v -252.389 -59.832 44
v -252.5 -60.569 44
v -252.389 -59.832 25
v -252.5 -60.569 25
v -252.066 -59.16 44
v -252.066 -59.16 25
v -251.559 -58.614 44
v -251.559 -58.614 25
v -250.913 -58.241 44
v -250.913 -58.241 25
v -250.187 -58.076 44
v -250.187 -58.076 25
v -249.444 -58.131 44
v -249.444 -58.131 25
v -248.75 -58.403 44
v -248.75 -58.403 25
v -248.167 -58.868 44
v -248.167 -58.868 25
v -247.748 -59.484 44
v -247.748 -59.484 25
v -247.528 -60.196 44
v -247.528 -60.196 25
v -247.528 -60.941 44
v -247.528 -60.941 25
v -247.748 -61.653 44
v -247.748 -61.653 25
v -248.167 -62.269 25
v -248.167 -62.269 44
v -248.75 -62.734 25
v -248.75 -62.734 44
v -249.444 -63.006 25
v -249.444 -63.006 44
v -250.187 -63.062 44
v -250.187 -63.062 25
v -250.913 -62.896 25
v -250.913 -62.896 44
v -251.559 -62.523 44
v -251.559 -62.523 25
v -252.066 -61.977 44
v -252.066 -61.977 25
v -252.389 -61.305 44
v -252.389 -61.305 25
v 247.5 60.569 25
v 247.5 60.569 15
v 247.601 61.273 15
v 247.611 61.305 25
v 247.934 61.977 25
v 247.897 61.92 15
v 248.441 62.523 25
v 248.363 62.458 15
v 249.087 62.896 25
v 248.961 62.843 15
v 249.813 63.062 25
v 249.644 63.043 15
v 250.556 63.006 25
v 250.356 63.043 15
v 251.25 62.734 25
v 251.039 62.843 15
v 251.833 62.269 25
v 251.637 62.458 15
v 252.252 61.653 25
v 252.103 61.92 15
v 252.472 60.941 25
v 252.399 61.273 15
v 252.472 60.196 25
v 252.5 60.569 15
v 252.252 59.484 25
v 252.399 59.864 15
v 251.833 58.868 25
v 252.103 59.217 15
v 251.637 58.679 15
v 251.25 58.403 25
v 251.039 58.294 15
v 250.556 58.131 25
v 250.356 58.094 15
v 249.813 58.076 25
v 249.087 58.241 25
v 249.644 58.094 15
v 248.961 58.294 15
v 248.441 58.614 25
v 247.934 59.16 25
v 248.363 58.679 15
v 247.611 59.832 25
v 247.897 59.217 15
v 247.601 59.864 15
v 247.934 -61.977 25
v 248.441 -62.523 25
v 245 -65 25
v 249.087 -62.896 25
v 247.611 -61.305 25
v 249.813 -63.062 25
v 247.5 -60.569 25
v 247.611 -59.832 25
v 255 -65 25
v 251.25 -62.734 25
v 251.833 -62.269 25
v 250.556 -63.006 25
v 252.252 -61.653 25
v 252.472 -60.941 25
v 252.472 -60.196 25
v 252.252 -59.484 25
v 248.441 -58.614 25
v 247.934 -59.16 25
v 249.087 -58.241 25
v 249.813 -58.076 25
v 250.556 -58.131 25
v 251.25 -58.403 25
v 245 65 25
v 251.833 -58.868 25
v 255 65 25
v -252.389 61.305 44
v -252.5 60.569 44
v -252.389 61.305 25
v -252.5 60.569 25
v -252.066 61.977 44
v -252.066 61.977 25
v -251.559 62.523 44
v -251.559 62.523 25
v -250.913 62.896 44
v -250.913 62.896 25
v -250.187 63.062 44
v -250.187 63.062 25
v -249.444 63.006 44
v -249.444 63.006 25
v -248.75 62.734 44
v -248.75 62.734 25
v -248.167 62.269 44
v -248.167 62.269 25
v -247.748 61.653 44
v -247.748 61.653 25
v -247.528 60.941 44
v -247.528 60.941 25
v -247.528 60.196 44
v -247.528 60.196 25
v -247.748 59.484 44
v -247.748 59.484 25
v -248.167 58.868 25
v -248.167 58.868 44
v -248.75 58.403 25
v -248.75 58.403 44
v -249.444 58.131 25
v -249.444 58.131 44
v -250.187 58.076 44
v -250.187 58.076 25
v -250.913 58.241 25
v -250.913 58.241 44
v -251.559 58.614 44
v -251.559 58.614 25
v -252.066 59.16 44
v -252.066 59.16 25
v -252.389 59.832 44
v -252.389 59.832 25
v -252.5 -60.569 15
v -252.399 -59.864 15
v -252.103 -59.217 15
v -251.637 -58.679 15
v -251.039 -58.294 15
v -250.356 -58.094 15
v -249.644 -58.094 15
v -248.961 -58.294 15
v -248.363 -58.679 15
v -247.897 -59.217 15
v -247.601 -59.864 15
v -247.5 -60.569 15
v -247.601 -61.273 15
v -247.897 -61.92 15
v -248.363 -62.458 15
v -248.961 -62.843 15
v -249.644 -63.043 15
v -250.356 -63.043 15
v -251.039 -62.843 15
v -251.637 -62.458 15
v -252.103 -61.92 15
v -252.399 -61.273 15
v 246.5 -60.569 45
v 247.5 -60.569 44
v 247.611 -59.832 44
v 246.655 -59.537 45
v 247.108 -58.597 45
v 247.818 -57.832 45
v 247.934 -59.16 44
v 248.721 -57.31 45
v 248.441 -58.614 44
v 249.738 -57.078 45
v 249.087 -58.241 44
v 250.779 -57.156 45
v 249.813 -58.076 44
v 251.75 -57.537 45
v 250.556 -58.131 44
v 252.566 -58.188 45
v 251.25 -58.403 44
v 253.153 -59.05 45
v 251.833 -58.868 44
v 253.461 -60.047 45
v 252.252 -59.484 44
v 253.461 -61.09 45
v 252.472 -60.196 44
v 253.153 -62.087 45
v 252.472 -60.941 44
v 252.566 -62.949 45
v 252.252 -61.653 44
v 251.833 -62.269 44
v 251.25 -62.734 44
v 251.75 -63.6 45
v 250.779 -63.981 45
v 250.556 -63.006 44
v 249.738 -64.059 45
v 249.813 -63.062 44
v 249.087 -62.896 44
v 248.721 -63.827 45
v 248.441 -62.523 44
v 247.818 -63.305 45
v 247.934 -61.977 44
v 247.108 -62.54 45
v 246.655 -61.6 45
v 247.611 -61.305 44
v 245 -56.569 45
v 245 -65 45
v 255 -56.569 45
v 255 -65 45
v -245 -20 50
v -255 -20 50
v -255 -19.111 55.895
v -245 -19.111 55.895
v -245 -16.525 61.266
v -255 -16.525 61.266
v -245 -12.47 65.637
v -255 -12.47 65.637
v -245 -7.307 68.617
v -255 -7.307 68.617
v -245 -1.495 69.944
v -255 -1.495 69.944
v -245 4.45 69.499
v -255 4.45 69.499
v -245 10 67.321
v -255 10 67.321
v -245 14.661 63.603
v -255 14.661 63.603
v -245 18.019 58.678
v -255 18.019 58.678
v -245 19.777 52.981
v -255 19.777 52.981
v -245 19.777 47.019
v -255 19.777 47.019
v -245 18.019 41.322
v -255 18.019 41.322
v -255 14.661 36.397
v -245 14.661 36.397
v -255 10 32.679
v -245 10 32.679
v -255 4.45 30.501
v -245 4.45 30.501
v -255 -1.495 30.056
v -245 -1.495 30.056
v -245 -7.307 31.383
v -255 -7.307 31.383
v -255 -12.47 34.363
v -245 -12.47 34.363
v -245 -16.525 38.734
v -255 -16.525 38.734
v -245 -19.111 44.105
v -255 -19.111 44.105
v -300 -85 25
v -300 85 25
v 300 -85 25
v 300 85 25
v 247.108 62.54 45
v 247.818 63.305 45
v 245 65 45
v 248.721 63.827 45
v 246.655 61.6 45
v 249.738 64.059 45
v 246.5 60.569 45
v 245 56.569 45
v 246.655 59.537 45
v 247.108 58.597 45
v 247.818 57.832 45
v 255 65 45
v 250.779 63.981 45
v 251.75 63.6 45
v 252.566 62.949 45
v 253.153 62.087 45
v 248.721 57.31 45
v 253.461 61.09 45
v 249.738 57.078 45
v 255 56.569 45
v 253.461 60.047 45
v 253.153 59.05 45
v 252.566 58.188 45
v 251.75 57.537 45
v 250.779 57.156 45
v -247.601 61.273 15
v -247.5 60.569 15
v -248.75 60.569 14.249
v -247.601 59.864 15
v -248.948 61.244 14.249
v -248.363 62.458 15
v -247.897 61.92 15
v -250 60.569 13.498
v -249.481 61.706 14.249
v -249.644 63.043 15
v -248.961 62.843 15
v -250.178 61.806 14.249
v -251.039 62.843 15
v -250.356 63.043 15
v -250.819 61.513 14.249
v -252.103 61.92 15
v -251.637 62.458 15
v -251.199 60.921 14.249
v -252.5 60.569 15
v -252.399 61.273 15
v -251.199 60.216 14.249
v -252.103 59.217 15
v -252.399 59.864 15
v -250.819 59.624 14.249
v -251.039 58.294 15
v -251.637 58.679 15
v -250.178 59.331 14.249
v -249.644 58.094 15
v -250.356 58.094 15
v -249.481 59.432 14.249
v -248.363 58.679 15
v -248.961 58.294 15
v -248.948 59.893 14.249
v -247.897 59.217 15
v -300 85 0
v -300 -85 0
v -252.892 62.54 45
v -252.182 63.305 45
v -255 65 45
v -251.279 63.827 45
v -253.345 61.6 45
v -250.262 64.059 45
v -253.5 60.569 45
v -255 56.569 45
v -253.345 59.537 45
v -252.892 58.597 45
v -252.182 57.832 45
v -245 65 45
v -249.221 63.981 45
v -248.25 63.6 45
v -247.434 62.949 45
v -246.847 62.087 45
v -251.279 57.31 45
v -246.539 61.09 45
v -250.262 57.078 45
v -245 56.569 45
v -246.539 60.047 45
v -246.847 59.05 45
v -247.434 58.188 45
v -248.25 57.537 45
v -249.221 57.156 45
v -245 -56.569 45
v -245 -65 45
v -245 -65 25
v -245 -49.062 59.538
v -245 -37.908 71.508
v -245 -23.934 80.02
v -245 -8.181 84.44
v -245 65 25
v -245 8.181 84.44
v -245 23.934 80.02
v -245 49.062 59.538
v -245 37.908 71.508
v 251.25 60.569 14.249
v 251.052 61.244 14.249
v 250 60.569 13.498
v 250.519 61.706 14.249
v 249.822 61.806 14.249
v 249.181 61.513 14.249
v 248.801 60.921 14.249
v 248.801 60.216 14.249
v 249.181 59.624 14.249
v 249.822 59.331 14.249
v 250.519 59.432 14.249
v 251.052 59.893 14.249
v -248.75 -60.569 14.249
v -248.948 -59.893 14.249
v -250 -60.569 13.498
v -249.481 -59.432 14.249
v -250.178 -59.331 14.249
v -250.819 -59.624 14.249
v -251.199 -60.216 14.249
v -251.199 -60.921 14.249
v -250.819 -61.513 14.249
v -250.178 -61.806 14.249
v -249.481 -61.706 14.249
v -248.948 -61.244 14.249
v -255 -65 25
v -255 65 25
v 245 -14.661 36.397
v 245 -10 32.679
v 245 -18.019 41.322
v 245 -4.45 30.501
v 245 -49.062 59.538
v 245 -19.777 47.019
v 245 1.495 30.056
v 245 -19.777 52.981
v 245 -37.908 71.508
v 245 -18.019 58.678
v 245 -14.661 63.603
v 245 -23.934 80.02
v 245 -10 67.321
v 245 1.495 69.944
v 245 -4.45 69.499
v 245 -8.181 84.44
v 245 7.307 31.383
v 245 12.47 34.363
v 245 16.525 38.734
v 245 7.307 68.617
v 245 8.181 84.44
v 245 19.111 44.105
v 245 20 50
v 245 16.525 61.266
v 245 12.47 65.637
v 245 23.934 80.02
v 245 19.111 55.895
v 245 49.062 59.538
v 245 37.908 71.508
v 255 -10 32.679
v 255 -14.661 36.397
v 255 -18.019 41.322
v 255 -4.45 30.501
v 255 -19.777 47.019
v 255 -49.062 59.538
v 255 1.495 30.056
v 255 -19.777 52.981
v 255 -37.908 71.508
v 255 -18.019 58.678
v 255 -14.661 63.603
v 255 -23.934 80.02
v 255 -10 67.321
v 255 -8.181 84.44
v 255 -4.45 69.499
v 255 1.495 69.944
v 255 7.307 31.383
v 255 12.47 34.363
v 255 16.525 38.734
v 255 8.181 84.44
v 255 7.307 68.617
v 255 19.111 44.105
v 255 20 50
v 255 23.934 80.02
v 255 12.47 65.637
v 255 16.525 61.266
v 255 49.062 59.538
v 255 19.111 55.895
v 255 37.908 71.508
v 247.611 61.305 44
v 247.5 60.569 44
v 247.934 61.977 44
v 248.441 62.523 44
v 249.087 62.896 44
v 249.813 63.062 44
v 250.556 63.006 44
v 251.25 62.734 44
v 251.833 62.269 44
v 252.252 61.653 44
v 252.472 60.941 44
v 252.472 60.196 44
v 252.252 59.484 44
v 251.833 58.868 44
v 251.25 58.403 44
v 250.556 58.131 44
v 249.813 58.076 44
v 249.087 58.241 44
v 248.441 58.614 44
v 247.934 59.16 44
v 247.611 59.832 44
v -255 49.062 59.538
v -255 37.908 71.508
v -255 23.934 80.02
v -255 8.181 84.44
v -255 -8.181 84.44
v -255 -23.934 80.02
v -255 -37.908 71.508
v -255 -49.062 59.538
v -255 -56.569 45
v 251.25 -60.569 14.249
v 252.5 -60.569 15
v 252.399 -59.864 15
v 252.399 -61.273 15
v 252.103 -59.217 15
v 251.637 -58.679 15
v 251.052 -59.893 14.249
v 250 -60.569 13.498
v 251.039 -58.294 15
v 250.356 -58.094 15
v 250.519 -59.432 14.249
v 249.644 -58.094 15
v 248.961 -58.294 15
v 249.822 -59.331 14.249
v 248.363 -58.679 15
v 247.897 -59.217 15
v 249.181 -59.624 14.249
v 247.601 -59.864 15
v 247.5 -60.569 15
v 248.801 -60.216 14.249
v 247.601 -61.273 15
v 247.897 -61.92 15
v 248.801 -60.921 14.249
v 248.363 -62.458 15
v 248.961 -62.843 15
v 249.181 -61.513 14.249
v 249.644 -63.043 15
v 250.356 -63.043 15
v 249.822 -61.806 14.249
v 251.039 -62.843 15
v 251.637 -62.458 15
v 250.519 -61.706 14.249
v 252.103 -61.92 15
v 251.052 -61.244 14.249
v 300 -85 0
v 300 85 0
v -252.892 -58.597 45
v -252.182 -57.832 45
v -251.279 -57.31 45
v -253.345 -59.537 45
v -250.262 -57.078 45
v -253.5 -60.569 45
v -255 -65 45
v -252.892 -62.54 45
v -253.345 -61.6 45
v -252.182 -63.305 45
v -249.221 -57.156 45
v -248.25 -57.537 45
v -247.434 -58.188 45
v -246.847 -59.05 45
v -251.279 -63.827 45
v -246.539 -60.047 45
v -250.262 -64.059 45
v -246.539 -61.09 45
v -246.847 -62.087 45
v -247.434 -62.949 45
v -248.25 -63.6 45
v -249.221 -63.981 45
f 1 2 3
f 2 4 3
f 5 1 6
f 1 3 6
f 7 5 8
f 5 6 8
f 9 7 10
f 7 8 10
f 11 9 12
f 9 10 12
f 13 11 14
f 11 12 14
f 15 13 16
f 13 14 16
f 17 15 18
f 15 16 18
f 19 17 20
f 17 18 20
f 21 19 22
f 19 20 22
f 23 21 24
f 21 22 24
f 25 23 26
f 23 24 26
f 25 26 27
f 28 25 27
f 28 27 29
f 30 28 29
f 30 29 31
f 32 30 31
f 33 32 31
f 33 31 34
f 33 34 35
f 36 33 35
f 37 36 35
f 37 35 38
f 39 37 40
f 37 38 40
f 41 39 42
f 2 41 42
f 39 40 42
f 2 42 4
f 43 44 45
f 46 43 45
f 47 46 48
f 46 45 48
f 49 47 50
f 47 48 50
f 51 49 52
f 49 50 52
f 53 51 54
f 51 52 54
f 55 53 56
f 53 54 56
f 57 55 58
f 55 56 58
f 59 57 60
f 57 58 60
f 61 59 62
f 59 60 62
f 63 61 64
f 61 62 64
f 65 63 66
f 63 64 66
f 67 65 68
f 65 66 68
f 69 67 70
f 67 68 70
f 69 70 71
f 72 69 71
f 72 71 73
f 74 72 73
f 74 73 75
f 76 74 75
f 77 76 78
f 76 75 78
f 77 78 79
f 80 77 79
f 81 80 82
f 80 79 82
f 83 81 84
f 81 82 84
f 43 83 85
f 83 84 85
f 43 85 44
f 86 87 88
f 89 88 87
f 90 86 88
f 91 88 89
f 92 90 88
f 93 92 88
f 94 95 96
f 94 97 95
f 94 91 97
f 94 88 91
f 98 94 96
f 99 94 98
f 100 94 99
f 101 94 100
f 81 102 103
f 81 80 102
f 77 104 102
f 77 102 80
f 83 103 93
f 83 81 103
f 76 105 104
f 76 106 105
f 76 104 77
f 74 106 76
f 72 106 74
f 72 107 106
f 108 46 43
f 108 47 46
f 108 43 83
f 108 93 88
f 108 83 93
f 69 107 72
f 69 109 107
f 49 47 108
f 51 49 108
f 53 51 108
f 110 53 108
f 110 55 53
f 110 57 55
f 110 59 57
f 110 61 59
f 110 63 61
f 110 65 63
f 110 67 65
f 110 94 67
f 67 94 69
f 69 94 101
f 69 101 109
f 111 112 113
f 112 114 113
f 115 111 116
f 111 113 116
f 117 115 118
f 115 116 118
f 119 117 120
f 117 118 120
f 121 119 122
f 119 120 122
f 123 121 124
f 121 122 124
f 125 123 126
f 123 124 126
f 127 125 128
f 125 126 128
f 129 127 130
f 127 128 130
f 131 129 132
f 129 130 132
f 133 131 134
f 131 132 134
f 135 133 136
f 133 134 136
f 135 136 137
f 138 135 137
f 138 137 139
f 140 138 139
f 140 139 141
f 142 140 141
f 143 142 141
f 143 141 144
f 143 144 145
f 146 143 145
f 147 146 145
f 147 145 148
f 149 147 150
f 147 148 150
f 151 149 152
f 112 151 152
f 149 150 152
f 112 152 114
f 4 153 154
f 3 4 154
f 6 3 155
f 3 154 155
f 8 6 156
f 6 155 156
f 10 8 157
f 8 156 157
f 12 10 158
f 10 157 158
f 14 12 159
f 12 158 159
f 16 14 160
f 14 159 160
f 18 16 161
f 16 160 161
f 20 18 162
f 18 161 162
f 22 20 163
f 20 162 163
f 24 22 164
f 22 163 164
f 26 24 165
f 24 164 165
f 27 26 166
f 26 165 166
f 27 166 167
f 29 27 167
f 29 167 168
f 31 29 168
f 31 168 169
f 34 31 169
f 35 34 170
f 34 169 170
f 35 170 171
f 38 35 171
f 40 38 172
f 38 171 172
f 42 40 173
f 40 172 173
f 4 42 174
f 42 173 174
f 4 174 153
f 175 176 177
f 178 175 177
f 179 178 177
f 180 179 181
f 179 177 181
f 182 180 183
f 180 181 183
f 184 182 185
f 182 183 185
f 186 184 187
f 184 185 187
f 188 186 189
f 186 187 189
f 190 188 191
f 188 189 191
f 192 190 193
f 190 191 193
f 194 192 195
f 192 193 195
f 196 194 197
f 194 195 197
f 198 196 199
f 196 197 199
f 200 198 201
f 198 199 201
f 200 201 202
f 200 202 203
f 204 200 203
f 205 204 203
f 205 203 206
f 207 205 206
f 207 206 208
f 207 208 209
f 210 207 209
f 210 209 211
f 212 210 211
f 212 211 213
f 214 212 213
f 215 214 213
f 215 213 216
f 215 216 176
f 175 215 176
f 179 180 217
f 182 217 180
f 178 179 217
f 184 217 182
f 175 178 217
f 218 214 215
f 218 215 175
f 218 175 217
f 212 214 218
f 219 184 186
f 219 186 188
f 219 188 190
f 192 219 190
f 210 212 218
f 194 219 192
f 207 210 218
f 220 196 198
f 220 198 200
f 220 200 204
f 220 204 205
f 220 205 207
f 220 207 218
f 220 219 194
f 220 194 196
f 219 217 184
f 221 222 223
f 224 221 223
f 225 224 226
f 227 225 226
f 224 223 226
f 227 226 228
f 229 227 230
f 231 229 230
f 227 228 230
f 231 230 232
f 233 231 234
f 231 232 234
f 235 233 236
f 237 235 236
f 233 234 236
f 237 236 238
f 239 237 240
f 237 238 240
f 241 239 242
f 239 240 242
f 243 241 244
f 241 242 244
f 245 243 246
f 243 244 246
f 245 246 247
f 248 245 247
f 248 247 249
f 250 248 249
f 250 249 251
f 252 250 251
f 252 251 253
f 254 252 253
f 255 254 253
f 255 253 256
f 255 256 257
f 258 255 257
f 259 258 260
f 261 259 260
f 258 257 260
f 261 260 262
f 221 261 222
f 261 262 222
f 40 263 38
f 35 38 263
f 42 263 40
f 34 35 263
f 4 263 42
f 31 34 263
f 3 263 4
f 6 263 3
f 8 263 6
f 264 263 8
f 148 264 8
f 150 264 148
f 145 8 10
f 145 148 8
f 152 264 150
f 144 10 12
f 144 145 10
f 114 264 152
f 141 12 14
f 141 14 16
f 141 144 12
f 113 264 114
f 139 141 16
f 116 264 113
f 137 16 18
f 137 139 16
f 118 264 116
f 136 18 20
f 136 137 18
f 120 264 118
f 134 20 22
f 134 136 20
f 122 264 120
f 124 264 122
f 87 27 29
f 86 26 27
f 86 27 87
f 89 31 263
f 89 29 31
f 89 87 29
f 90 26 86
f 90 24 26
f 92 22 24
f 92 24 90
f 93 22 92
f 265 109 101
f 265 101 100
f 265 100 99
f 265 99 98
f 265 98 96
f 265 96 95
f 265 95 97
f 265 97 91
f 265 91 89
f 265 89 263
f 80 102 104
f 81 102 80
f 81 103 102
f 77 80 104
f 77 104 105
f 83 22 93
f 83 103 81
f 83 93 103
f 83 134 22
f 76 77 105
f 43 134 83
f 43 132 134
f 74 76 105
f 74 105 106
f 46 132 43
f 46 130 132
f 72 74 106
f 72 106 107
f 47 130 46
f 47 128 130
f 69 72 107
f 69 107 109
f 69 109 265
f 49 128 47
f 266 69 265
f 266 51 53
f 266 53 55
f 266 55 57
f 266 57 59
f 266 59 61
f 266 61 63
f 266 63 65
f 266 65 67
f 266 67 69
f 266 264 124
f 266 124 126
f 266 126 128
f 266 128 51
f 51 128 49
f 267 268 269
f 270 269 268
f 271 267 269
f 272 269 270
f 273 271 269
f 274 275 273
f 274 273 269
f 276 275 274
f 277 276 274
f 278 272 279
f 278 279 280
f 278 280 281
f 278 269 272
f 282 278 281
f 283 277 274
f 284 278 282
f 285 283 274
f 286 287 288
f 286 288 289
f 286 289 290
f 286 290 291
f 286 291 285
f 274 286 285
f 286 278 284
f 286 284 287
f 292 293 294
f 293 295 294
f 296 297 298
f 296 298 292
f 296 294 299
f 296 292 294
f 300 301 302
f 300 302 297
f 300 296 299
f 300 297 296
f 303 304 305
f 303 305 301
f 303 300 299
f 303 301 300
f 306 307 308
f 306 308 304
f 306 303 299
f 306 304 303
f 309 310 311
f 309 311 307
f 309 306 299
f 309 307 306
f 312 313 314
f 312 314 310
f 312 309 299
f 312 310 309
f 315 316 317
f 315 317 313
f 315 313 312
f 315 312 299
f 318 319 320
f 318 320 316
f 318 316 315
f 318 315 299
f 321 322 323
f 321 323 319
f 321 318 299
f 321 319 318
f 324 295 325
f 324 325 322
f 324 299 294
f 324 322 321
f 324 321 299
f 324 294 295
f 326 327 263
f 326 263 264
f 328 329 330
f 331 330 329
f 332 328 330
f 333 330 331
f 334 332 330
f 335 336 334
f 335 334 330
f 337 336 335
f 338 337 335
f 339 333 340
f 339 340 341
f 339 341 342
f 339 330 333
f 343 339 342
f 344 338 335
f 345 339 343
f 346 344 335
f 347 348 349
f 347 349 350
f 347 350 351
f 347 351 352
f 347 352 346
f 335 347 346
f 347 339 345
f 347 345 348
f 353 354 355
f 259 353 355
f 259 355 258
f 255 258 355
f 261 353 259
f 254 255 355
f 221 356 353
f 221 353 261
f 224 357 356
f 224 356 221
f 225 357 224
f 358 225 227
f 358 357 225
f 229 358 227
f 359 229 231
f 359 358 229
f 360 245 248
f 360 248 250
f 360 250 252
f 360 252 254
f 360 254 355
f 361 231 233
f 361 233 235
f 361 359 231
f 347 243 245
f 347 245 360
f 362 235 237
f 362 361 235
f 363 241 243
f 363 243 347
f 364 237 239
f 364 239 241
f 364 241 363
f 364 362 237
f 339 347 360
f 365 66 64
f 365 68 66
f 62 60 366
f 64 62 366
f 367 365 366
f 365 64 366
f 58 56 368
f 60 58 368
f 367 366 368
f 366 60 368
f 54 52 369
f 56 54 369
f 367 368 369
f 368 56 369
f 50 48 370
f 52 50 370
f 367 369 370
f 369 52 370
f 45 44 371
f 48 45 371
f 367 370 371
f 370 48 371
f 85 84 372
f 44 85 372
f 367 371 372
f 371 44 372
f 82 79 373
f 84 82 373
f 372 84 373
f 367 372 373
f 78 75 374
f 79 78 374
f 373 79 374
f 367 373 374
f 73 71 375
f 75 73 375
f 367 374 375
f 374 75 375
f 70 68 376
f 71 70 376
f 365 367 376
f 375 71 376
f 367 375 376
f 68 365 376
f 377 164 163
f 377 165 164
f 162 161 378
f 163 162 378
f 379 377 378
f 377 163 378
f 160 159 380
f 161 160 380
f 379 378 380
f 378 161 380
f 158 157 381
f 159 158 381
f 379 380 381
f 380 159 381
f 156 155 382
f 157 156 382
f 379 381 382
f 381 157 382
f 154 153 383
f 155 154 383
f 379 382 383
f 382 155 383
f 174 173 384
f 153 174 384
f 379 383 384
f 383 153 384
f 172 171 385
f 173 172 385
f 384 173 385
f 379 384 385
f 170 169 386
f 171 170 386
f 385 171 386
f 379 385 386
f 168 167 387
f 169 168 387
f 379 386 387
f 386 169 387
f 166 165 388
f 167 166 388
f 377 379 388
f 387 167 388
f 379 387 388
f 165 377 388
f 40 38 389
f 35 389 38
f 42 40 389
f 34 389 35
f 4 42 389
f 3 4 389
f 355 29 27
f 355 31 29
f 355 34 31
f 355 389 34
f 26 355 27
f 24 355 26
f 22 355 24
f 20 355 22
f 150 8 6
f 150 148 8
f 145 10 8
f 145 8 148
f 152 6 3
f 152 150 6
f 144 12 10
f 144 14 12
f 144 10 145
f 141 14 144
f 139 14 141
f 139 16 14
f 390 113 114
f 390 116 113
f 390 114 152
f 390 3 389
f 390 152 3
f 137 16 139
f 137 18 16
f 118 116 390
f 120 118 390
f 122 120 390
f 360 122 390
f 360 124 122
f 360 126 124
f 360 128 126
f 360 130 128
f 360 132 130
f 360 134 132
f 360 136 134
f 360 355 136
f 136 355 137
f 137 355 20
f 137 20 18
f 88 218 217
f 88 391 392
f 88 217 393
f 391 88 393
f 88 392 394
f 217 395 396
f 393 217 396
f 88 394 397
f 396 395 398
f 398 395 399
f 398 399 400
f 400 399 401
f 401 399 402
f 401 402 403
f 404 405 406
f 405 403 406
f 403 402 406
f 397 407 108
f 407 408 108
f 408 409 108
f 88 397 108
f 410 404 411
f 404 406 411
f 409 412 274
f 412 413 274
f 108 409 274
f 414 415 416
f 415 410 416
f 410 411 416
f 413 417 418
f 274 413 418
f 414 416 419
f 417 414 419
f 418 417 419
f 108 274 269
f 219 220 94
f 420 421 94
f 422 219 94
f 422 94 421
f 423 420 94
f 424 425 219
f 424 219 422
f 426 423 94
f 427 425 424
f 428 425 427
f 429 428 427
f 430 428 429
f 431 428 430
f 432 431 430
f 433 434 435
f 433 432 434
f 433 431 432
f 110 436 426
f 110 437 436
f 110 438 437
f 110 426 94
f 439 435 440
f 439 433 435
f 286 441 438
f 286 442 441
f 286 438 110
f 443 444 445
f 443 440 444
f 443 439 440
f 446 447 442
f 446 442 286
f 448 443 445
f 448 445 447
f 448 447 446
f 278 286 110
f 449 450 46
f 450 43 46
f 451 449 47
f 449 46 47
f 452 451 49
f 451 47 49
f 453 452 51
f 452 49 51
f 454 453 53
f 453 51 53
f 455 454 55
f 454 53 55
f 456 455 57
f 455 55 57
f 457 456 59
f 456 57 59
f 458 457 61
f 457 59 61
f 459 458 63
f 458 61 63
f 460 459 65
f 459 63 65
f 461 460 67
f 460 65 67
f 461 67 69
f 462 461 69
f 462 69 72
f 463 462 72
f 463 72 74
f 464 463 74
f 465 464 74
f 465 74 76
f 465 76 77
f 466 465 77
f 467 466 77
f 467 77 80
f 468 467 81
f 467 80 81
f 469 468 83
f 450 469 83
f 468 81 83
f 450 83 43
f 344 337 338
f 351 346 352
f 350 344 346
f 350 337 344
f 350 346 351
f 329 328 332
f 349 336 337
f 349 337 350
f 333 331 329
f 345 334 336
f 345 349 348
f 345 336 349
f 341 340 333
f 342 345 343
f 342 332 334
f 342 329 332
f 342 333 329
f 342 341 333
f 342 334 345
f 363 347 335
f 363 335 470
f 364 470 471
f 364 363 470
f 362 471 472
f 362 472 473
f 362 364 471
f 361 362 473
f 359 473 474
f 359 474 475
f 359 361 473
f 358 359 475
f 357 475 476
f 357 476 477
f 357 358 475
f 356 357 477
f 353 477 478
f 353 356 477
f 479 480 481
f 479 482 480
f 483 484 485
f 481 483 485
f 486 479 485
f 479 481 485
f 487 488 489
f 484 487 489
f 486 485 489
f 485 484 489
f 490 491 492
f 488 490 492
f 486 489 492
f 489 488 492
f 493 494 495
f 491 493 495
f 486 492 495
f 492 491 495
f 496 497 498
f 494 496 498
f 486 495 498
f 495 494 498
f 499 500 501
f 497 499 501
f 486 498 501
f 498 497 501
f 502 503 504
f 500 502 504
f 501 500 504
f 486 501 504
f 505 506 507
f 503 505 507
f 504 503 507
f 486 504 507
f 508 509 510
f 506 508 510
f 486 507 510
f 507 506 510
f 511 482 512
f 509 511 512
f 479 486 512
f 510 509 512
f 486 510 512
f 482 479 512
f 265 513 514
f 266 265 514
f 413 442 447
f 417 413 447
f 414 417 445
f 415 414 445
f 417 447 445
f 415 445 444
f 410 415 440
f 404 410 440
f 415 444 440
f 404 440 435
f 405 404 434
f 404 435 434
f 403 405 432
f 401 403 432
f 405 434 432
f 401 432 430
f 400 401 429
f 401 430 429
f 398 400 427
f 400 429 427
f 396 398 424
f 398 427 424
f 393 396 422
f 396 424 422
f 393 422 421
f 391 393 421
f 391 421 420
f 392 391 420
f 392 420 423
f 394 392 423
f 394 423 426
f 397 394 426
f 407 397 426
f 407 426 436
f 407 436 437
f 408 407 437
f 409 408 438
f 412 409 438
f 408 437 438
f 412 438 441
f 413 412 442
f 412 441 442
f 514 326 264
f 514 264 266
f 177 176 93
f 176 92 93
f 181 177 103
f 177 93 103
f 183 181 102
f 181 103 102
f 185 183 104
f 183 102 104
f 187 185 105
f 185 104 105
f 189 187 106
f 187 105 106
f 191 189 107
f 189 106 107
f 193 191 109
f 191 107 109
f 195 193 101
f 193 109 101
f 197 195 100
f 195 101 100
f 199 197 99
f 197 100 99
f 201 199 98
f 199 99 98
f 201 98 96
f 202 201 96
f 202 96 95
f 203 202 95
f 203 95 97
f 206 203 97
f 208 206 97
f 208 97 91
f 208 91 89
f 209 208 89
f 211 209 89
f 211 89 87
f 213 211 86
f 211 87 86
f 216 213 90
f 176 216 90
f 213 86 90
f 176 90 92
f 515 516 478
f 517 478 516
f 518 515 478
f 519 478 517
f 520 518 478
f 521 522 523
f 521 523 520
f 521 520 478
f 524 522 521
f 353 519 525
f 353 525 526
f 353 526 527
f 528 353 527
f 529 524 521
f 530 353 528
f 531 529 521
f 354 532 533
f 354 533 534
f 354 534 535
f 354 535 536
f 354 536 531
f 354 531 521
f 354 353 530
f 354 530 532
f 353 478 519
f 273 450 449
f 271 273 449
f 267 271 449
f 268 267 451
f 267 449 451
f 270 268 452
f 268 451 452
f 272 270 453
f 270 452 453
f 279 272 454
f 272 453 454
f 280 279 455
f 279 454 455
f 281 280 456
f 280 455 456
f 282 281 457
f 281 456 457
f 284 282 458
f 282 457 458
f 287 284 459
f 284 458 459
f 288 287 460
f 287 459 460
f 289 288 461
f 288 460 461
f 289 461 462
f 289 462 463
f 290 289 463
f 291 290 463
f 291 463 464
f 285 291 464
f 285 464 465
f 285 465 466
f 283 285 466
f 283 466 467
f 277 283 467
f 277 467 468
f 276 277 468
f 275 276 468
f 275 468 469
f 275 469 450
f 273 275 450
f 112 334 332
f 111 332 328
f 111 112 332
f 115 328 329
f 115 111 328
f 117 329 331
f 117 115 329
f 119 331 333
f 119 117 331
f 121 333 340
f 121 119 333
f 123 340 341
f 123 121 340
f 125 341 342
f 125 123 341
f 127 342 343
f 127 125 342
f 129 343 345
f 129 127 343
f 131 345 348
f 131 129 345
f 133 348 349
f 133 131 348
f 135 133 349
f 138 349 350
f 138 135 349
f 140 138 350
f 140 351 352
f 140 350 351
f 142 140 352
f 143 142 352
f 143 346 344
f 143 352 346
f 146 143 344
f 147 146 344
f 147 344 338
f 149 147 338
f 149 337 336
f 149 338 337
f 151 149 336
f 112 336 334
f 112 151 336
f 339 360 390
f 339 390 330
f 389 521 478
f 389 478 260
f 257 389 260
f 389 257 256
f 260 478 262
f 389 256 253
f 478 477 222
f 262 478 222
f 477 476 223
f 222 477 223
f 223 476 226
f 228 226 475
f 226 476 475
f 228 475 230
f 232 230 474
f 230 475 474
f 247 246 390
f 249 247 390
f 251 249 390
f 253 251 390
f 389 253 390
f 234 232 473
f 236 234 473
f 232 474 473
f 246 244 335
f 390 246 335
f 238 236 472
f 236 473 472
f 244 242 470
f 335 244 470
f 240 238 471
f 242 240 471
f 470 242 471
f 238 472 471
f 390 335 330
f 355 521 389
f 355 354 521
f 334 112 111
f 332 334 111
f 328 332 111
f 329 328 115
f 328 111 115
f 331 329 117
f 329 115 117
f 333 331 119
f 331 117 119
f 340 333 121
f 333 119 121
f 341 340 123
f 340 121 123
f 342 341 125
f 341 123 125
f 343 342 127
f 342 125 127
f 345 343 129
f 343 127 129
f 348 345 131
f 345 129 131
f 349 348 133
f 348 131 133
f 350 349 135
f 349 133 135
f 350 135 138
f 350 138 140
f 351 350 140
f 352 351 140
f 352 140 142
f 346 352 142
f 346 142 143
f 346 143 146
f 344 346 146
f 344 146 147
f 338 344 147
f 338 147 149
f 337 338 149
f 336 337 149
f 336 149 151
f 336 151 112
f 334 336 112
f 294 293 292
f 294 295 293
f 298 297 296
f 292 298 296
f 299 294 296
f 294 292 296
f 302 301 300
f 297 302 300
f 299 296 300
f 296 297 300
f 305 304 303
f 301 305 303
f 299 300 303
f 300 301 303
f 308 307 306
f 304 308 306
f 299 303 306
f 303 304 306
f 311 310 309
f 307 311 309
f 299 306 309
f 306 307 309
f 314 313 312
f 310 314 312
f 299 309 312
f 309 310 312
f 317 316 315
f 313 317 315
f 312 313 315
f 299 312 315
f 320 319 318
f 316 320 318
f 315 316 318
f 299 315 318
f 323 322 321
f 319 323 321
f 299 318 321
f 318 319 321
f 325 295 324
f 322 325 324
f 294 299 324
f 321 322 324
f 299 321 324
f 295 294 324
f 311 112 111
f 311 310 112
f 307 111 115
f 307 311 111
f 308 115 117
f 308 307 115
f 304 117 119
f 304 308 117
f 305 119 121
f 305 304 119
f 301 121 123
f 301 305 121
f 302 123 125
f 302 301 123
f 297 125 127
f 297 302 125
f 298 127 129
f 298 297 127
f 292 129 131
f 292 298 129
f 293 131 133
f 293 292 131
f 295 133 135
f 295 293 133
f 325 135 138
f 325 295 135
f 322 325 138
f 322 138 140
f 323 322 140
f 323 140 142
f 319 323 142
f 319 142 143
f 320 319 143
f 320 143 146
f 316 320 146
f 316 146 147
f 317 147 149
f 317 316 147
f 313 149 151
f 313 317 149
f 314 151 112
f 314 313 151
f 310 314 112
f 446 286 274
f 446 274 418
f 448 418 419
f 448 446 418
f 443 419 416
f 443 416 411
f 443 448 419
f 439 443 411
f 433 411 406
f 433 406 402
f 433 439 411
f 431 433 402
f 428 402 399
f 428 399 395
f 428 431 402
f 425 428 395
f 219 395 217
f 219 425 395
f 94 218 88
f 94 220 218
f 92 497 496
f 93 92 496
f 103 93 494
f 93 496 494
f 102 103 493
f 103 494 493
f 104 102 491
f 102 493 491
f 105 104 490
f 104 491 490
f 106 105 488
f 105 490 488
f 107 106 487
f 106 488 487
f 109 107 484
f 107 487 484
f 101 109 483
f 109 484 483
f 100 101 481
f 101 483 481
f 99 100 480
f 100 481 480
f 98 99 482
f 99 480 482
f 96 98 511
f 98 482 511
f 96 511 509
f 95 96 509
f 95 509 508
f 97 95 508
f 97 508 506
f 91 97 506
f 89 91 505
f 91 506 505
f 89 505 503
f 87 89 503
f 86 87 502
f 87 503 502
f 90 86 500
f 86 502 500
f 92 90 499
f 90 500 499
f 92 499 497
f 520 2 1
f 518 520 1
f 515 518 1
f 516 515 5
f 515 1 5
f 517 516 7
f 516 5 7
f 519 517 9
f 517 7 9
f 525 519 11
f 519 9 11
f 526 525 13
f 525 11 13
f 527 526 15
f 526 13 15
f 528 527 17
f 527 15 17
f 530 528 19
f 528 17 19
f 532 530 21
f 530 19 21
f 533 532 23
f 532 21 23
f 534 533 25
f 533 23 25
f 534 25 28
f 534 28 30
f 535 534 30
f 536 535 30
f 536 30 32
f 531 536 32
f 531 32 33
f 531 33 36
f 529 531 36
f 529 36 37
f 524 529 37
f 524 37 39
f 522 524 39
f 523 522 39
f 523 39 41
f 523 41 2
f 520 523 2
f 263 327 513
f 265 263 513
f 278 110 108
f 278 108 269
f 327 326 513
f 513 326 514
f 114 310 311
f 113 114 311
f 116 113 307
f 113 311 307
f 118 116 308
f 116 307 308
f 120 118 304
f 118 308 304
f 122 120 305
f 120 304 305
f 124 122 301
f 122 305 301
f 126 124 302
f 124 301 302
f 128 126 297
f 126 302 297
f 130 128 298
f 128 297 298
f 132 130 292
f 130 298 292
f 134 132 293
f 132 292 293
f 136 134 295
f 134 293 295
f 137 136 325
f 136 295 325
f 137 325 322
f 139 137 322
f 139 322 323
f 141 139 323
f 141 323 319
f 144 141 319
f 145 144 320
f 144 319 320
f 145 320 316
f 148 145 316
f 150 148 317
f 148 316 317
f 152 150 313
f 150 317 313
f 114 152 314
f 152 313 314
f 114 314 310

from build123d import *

# Parameters (mm, degrees)
F0_W              = 600
F0_H              = 170
F1_DEPTH          = 25
F3_DEPTH          = 5
F6_R              = 20
F7_DEPTH          = 10
F8_R              = 20
F9_DEPTH          = 10
F11_D             = 5
F11_DEPTH         = 30
F11_CSINK_D       = 7
F11_CSINK_ANGLE   = 90
F11_TIP           = 1.5021515476
F11_2_D           = 5
F11_2_DEPTH       = 30
F11_2_CSINK_D     = 7
F11_2_CSINK_ANGLE = 90
F11_2_TIP         = 1.5021515476
F12_R             = 3.5
F13_DEPTH         = 45
F16_D             = 5
F16_DEPTH         = 30
F16_CSINK_D       = 7
F16_CSINK_ANGLE   = 90
F16_TIP           = 1.5021515476
F16_2_D           = 5
F16_2_DEPTH       = 30
F16_2_CSINK_D     = 7
F16_2_CSINK_ANGLE = 90
F16_2_TIP         = 1.5021515476


with BuildPart() as f1:
    # F0 (on Top) → F1 (new body)
    with BuildSketch(Plane.XY):
        Rectangle(F0_W, F0_H)
    extrude(amount=F1_DEPTH)

    # F11
    with Locations(Plane.XY.offset(45)):
        with Locations((-250, 60.5685424949), (-250, -60.5685424949)):
            CounterSinkHole(F11_D / 2, F11_CSINK_D / 2, depth=F11_DEPTH, counter_sink_angle=F11_CSINK_ANGLE)
            with Locations((0, 0, -(F11_DEPTH + F11_TIP / 2))):  # 118° drill point
                Cone(0, F11_D / 2, F11_TIP, mode=Mode.SUBTRACT)


with BuildPart() as f3:
    # F2 (on Right) → F3 (new body, symmetric)
    with BuildSketch(Plane.YZ):
        with BuildLine():
            Line((-65, 25), (65, 25))
            Line((65, 25), (65, 45))
            Line((65, 45), (56.5685424949, 45))
            ThreePointArc((56.5685424949, 45), (0, 85), (-56.5685424949, 45))
            Line((-56.5685424949, 45), (-65, 45))
            Line((-65, 45), (-65, 25))
        make_face()
    extrude(amount=F3_DEPTH, both=True)


with BuildPart() as f4_1:
    # F4: copy of F3
    add(f3.part.moved(Location((-250, 0, 0))))

    # F6 (on face) → F7 (cut)
    with BuildSketch(Plane(origin=(-255, 0, 0), x_dir=(0, -1, 0), z_dir=(-1, 0, 0))):
        with Locations((0, 50)):
            Circle(F6_R)
    extrude(amount=-F7_DEPTH, mode=Mode.SUBTRACT)

    # F11#2
    with Locations(Plane.XY.offset(45)):
        with Locations((-250, 60.5685424949), (-250, -60.5685424949)):
            CounterSinkHole(F11_2_D / 2, F11_2_CSINK_D / 2, depth=F11_2_DEPTH, counter_sink_angle=F11_2_CSINK_ANGLE)
            with Locations((0, 0, -(F11_2_DEPTH + F11_2_TIP / 2))):  # 118° drill point
                Cone(0, F11_2_D / 2, F11_2_TIP, mode=Mode.SUBTRACT)


with BuildPart() as f3_1:
    # F5: moved
    add(f3.part.moved(Location((250, 0, 0))))

    # F8 (on face) → F9 (cut)
    with BuildSketch(Plane.YZ.offset(255)):
        with Locations((0, 50)):
            Circle(F8_R)
    extrude(amount=-F9_DEPTH, mode=Mode.SUBTRACT)

    # F16#2
    with Locations(Plane.XY.offset(45)):
        with Locations((250, 60.5685424949), (250, -60.5685424949)):
            CounterSinkHole(F16_2_D / 2, F16_2_CSINK_D / 2, depth=F16_2_DEPTH, counter_sink_angle=F16_2_CSINK_ANGLE)
            with Locations((0, 0, -(F16_2_DEPTH + F16_2_TIP / 2))):  # 118° drill point
                Cone(0, F16_2_D / 2, F16_2_TIP, mode=Mode.SUBTRACT)


with BuildPart() as f13:
    # F12 (on face) → F13 (new body, through all)
    with BuildSketch(Plane.XY.offset(45)):
        with Locations((-250, 60.5685424949)):
            Circle(F12_R)
    extrude(amount=-F13_DEPTH)

    # F14: cut F1, F4_1
    add(f1.part, mode=Mode.SUBTRACT)
    add(f4_1.part, mode=Mode.SUBTRACT)


with BuildPart() as f1_1:
    add(f1.part)

    # F16
    with Locations(Plane.XY.offset(45)):
        with Locations((250, 60.5685424949), (250, -60.5685424949)):
            CounterSinkHole(F16_D / 2, F16_CSINK_D / 2, depth=F16_DEPTH, counter_sink_angle=F16_CSINK_ANGLE)
            with Locations((0, 0, -(F16_DEPTH + F16_TIP / 2))):  # 118° drill point
                Cone(0, F16_D / 2, F16_TIP, mode=Mode.SUBTRACT)


solid = Compound([f4_1.part, f3_1.part, f13.part, f1_1.part])
